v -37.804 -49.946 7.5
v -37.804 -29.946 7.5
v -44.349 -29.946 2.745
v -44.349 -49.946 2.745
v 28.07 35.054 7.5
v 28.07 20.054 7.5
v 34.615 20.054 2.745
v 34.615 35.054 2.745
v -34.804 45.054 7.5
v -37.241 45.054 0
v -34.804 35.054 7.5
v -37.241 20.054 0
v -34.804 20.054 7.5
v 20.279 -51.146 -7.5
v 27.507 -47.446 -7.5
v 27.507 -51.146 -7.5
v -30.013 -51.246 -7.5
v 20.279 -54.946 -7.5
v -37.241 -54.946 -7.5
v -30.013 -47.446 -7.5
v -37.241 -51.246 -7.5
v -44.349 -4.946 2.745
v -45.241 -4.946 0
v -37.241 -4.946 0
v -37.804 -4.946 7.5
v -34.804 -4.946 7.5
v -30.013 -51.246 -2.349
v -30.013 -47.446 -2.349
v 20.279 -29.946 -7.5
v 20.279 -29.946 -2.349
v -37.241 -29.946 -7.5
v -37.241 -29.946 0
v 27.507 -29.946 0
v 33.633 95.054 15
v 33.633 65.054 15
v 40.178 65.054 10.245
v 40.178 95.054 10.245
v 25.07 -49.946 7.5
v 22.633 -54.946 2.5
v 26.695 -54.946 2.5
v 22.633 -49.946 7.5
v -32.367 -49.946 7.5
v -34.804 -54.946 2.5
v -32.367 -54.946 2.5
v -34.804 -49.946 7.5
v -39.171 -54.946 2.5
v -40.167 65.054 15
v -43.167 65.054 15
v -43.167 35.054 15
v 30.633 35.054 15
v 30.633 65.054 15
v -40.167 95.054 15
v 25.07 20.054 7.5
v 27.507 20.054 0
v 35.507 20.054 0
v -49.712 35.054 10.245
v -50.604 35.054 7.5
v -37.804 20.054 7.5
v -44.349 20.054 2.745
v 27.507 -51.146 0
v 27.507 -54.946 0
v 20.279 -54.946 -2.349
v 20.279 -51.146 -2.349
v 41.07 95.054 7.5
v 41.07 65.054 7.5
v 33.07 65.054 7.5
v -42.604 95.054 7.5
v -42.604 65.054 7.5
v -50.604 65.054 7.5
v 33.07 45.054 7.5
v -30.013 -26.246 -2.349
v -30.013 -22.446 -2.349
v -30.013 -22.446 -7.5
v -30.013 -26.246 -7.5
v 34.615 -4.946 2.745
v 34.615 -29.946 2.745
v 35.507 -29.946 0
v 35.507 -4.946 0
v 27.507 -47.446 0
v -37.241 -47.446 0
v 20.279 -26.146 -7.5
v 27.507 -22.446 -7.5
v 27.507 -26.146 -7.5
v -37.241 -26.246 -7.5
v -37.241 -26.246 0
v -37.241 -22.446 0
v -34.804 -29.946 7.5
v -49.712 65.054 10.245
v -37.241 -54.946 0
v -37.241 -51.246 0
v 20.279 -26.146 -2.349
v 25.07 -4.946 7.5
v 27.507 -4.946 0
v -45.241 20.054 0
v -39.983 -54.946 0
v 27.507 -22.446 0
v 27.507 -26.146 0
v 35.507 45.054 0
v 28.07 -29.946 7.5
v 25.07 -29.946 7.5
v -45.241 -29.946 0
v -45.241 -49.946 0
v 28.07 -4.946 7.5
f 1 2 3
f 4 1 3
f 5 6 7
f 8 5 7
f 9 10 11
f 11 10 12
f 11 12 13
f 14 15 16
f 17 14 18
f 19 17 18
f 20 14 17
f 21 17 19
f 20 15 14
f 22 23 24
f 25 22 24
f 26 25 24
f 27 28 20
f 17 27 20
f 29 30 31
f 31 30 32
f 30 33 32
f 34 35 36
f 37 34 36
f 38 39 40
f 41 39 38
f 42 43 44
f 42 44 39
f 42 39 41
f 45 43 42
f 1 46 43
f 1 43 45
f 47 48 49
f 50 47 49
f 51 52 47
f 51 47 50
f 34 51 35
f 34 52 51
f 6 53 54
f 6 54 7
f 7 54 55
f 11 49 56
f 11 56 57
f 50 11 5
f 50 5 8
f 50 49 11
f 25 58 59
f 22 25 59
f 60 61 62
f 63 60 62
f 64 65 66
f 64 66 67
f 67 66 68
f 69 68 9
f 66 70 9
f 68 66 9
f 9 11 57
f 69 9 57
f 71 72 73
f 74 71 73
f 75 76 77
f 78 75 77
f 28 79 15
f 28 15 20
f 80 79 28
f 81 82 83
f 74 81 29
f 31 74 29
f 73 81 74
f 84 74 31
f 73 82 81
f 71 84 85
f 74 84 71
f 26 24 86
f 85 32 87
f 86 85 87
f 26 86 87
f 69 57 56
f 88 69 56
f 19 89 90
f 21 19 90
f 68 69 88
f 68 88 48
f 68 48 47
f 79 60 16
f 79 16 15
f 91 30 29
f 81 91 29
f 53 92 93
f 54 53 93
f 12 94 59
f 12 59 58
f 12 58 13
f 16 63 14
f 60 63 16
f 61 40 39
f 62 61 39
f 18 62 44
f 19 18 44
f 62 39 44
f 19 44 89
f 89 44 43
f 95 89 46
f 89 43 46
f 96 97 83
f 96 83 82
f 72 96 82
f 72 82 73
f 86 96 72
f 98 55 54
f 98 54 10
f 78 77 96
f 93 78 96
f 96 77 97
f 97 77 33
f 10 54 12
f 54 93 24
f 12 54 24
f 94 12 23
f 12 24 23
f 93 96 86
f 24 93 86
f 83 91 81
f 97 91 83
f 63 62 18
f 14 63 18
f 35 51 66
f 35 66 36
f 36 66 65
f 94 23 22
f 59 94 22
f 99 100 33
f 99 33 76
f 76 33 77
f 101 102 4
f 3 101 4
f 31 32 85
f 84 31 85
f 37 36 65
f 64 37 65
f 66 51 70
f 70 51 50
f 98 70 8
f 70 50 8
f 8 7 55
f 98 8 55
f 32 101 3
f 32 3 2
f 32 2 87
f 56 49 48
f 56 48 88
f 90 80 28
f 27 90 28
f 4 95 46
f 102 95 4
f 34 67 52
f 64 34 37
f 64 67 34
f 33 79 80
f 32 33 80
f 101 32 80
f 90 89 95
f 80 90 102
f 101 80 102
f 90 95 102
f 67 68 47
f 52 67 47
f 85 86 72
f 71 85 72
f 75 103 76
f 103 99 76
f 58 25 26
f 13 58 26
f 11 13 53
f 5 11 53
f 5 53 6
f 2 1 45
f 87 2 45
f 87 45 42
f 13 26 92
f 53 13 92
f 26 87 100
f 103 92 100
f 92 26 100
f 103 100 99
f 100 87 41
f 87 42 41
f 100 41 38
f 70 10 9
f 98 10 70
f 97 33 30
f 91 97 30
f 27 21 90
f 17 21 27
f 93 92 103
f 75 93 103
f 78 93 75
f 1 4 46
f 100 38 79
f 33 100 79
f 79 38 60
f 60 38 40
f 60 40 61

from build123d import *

# Parameters (mm, degrees)
BOSS_EXTRUDE1_DEPTH = 7.5
BOSS_EXTRUDE2_DEPTH = 7.5
DRAFT2_START        = -54.946043165
DRAFT2_DEPTH        = 100
DRAFT2_2_DEPTH      = 25
DRAFT2_START_2      = -29.946043165
DRAFT2_3_DEPTH      = 25
DRAFT2_START_3      = -4.946043165
DRAFT2_4_DEPTH      = 25
DRAFT2_START_4      = 20.053956835
DRAFT2_5_DEPTH      = 25
DRAFT2_START_5      = 35.053956835
DRAFT2_6_DEPTH      = 30
DRAFT2_START_6      = 65.053956835
DRAFT2_7_DEPTH      = 30
SKETCH3_W           = 64.747590887
SKETCH3_H           = 7.5
BOSS_EXTRUDE3_DEPTH = 7.5
CUT_EXTRUDE1_DEPTH  = 3.8
CUT_EXTRUDE2_DEPTH  = 3.8
LPATTERN1_COUNT     = 2
LPATTERN1_PITCH     = 25


# Read off the part's stored shape, not the designer's step: Draft2
with BuildPart() as part:
    # Sketch1 → Boss-Extrude1 (new body)
    with BuildSketch(Plane.XY):
        Polygon((-40.366906475, -54.946043165), (22.633093525, -54.946043165), (22.633093525, -29.946043165), (30.633093525, -29.946043165), (30.633093525, -4.946043165), (22.633093525, -4.946043165), (22.633093525, 20.053956835), (30.633093525, 20.053956835), (30.633093525, 45.053956835), (-32.366906475, 45.053956835), (-32.366906475, 20.053956835), (-40.366906475, 20.053956835), (-40.366906475, -4.946043165), (-32.366906475, -4.946043165), (-32.366906475, -29.946043165), (-40.366906475, -29.946043165), align=None)
    extrude(amount=BOSS_EXTRUDE1_DEPTH)

    # Sketch2 → Boss-Extrude2 (add)
    with BuildSketch(Plane.XY.offset(7.5)):
        Polygon((-48.166906475, 35.053956835), (30.633093525, 35.053956835), (30.633093525, 65.053956835), (38.633093525, 65.053956835), (38.633093525, 95.053956835), (-40.166906475, 95.053956835), (-40.166906475, 65.053956835), (-48.166906475, 65.053956835), align=None)
    extrude(amount=BOSS_EXTRUDE2_DEPTH)

    # Draft2 outline → Draft2 (add)
    with BuildSketch(Plane(origin=(0, 0, 0), x_dir=(1, 0, 0), z_dir=(0, 1, 0)).offset(DRAFT2_START)):
        Polygon((-32.366906475, 0), (-37.240701918, 0), (-34.803804197, -7.5), (-32.366906475, -7.5), align=None)
        Polygon((27.506888969, 0), (22.633093525, 0), (22.633093525, -7.5), (25.069991247, -7.5), align=None)
    extrude(amount=DRAFT2_DEPTH)

    # Draft2 2 outline → Draft2 2 (add)
    with BuildSketch(Plane(origin=(0, 0, 0), x_dir=(1, 0, 0), z_dir=(0, 1, 0)).offset(DRAFT2_START)):
        Polygon((-40.366906475, 0), (-45.240701918, 0), (-42.803804197, -7.5), (-40.366906475, -7.5), align=None)
    extrude(amount=DRAFT2_2_DEPTH)

    # Draft2 3 outline → Draft2 3 (add)
    with BuildSketch(Plane(origin=(0, 0, 0), x_dir=(1, 0, 0), z_dir=(0, 1, 0)).offset(DRAFT2_START_2)):
        Polygon((35.506888969, 0), (30.633093525, 0), (30.633093525, -7.5), (33.069991247, -7.5), align=None)
    extrude(amount=DRAFT2_3_DEPTH)

    # Draft2 4 outline → Draft2 4 (add)
    with BuildSketch(Plane(origin=(0, 0, 0), x_dir=(1, 0, 0), z_dir=(0, 1, 0)).offset(DRAFT2_START_3)):
        Polygon((-40.366906475, 0), (-45.240701918, 0), (-42.803804197, -7.5), (-40.366906475, -7.5), align=None)
    extrude(amount=DRAFT2_4_DEPTH)

    # Draft2 5 outline → Draft2 5 (add)
    with BuildSketch(Plane(origin=(0, 0, 0), x_dir=(1, 0, 0), z_dir=(0, 1, 0)).offset(DRAFT2_START_4)):
        Polygon((35.506888969, 0), (30.633093525, 0), (30.633093525, -7.5), (33.069991247, -7.5), align=None)
    extrude(amount=DRAFT2_5_DEPTH)

    # Draft2 6 outline → Draft2 6 (add)
    with BuildSketch(Plane(origin=(0, 0, 0), x_dir=(1, 0, 0), z_dir=(0, 1, 0)).offset(DRAFT2_START_5)):
        Polygon((-48.166906475, -15), (-48.166906475, -7.5), (-50.603804197, -7.5), align=None)
        Polygon((33.069991247, -7.5), (30.633093525, -7.5), (30.633093525, -15), align=None)
    extrude(amount=DRAFT2_6_DEPTH)

    # Draft2 7 outline → Draft2 7 (add)
    with BuildSketch(Plane(origin=(0, 0, 0), x_dir=(1, 0, 0), z_dir=(0, 1, 0)).offset(DRAFT2_START_6)):
        Polygon((41.069991247, -7.5), (38.633093525, -7.5), (38.633093525, -15), align=None)
        Polygon((-40.166906475, -7.5), (-42.603804197, -7.5), (-40.166906475, -15), align=None)
    extrude(amount=DRAFT2_7_DEPTH)

    # Sketch3 → Boss-Extrude3 (add)
    with BuildSketch(Plane(origin=(0, 0, 0), x_dir=(-1, 0, 0), z_dir=(0, 0, -1))):
        with Locations((4.866906474, -51.196043165)):
            Rectangle(SKETCH3_W, SKETCH3_H)
    boss_extrude3 = extrude(amount=BOSS_EXTRUDE3_DEPTH)

    # Sketch4 → Cut-Extrude1 (cut)
    with BuildSketch(Plane.XZ.offset(54.946043165)):
        Polygon((27.506888969, -7.5), (27.506888969, 0), (20.278859445, -2.348529157), (20.278859445, -7.5), align=None)
    cut_extrude1 = extrude(amount=-CUT_EXTRUDE1_DEPTH, mode=Mode.SUBTRACT)

    # Sketch5 → Cut-Extrude2 (cut)
    with BuildSketch(Plane(origin=(0, -47.446043165, 0), x_dir=(1, 0, 0), z_dir=(0, 1, 0))):
        Polygon((-37.240701918, 7.5), (-37.240701918, 0), (-30.012672394, 2.348529157), (-30.012672394, 7.5), align=None)
    cut_extrude2 = extrude(amount=-CUT_EXTRUDE2_DEPTH, mode=Mode.SUBTRACT)

    # LPattern1: Boss-Extrude3, Cut-Extrude1, Cut-Extrude2 ×2
    with Locations(*[(0, i * LPATTERN1_PITCH, 0) for i in range(1, LPATTERN1_COUNT)]):
        add(boss_extrude3)
        add(cut_extrude1, mode=Mode.SUBTRACT)
        add(cut_extrude2, mode=Mode.SUBTRACT)

    # Chamfer2
    # the kernel refuses this chamfer: 5 mm, written as the material it takes off along each edge
    with BuildSketch(Plane(origin=(-40.441261641, -51.612709832, 4.248239139), x_dir=(-0.7189342036162105, 0.6942471081166146, 0.033978872000742164), z_dir=(-0.4932114534551065, -0.5439749702030539, 0.6788473274406317))) as chamfer2_piece_1:
        Polygon((-3.286728939, 2.231187156), (3.915317626, 2.231187156), (-0.628588687, -4.462374312), align=None)
    extrude(amount=5.70452533, mode=Mode.SUBTRACT)
    with BuildSketch(Plane(origin=(33.069991247, -42.853897845, 7.5), x_dir=(-0.9997407638607628, 0, 0.022768510603425433), z_dir=(0, 1, 0))) as chamfer2_piece_2:
        with BuildLine():
            Line((5.163141872, 0), (-1.817393185, -4.83271311))
            Line((-1.817393185, -4.83271311), (-1.911770596, -4.799654007))
            ThreePointArc((-1.911770596, -4.799654007), (-0.947600353, -2.402729105), (-0.094377411, 0.033059103))
            Line((-0.094377411, 0.033059103), (0.002276851, 0.099974076))
            ThreePointArc((0.002276851, 0.099974076), (2.582509488, 0.041210789), (5.165418723, 0.099974076))
            Line((5.165418723, 0.099974076), (5.163141872, 0))
        make_face()
    extrude(amount=50.815709359, mode=Mode.SUBTRACT)
    with BuildSketch(Plane(origin=(-49.214170654, -54.946043165, -12.229079318), x_dir=(0.9506969379377622, -0.027495876610586285, -0.30890016018962835), z_dir=(0.309016994289291, 0, 0.951056516322985))) as chamfer2_piece_3:
        with BuildLine():
            Line((5.143365976, 0), (-0.282735774, 5.135588968))
            Line((-0.282735774, 5.135588968), (-0.382697966, 5.13283938))
            ThreePointArc((-0.382697966, 5.13283938), (-0.170646135, 2.566989148), (-0.099962192, -0.002749588))
            Line((-0.099962192, -0.002749588), (0.002749588, -0.099962192))
            ThreePointArc((0.002749588, -0.099962192), (2.572488324, -0.029278248), (5.146115564, -0.099962192))
            Line((5.146115564, -0.099962192), (5.143365976, 0))
        make_face()
    extrude(amount=33.602796561, mode=Mode.SUBTRACT)
    with BuildSketch(Plane(origin=(33.069991247, 7.146102155, 7.5), x_dir=(-0.9997407638607628, 0, 0.022768510603425433), z_dir=(0, 1, 0))) as chamfer2_piece_4:
        with BuildLine():
            Line((5.163141872, 0), (-1.817393185, -4.83271311))
            Line((-1.817393185, -4.83271311), (-1.911770596, -4.799654007))
            ThreePointArc((-1.911770596, -4.799654007), (-0.947600353, -2.402729105), (-0.094377411, 0.033059103))
            Line((-0.094377411, 0.033059103), (0.002276851, 0.099974076))
            ThreePointArc((0.002276851, 0.099974076), (2.582509488, 0.041210789), (5.165418723, 0.099974076))
            Line((5.165418723, 0.099974076), (5.163141872, 0))
        make_face()
    extrude(amount=27.90785468, mode=Mode.SUBTRACT)
    with BuildSketch(Plane(origin=(-42.803804197, -67.853897845, 7.5), x_dir=(0.9997407638607191, 0, 0.022768510605345404), z_dir=(0, 1, 0)), Plane(origin=(-42.803804197, -17.853897845, 7.5), x_dir=(0.9997407638607191, 0, 0.022768510605345404), z_dir=(0, 1, 0))) as chamfer2_piece_5:
        with BuildLine():
            Line((5.163141872, 0), (-1.817393184, 4.83271311))
            Line((-1.817393184, 4.83271311), (-1.911770595, 4.799654007))
            ThreePointArc((-1.911770595, 4.799654007), (-0.947600353, 2.402729105), (-0.094377411, -0.033059103))
            Line((-0.094377411, -0.033059103), (0.002276851, -0.099974076))
            ThreePointArc((0.002276851, -0.099974076), (2.582509488, -0.041210789), (5.165418723, -0.099974076))
            Line((5.165418723, -0.099974076), (5.163141872, 0))
        make_face()
    extrude(amount=50.815709359, mode=Mode.SUBTRACT)
    with BuildSketch(Plane(origin=(-48.166906475, 77.961811514, 15), x_dir=(0.9997407638607629, 0, 0.022768510603425628), z_dir=(0, -1, 0)), Plane(origin=(38.633093525, 52.146102155, 15), x_dir=(-0.9997407638607629, 0, 0.022768510603425628), z_dir=(0, 1, 0))) as chamfer2_piece_6:
        with BuildLine():
            Line((5.163141872, 0), (-1.817393185, -4.83271311))
            Line((-1.817393185, -4.83271311), (-1.911770596, -4.799654007))
            ThreePointArc((-1.911770596, -4.799654007), (-0.947600353, -2.402729105), (-0.094377411, 0.033059103))
            Line((-0.094377411, 0.033059103), (0.002276851, 0.099974076))
            ThreePointArc((0.002276851, 0.099974076), (2.582509488, 0.041210789), (5.165418723, 0.099974076))
            Line((5.165418723, 0.099974076), (5.163141872, 0))
        make_face()
    extrude(amount=55.815709359, mode=Mode.SUBTRACT)
    with BuildSketch(Plane(origin=(-32.366906475, -54.946043165, 7.5), x_dir=(0, -0.027495876610586317, -0.9996219169112968), z_dir=(1, 0, 0))) as chamfer2_piece_7:
        with BuildLine():
            Line((5.143365976, 0), (-0.282735774, 5.135588968))
            Line((-0.282735774, 5.135588968), (-0.382697966, 5.13283938))
            ThreePointArc((-0.382697966, 5.13283938), (-0.170646135, 2.566989148), (-0.099962192, -0.002749588))
            Line((-0.099962192, -0.002749588), (0.002749588, -0.099962192))
            ThreePointArc((0.002749588, -0.099962192), (2.572488324, -0.029278248), (5.146115564, -0.099962192))
            Line((5.146115564, -0.099962192), (5.143365976, 0))
        make_face()
    extrude(amount=55, mode=Mode.SUBTRACT)
    with BuildSketch(Plane(origin=(-34.803804197, -54.946043165, 7.5), x_dir=(0, -0.02749587670275982, -0.9996219169087613), z_dir=(1, 0, 0))) as chamfer2_piece_8:
        with BuildLine():
            Line((5.143365976, 0), (-0.282735775, 5.135588968))
            Line((-0.282735775, 5.135588968), (-0.382697967, 5.13283938))
            ThreePointArc((-0.382697967, 5.13283938), (-0.170646136, 2.566989148), (-0.099962192, -0.002749588))
            Line((-0.099962192, -0.002749588), (0.002749588, -0.099962192))
            ThreePointArc((0.002749588, -0.099962192), (2.572488324, -0.029278248), (5.146115564, -0.099962192))
            Line((5.146115564, -0.099962192), (5.143365976, 0))
        make_face()
    extrude(amount=2.436897722, mode=Mode.SUBTRACT)
    with BuildSketch(Plane(origin=(22.633093525, -54.946043165, 7.5), x_dir=(0, -0.02749587670275982, -0.9996219169087613), z_dir=(1, 0, 0))) as chamfer2_piece_9:
        with BuildLine():
            Line((5.143365976, 0), (-0.282735775, 5.135588968))
            Line((-0.282735775, 5.135588968), (-0.382697967, 5.13283938))
            ThreePointArc((-0.382697967, 5.13283938), (-0.170646136, 2.566989148), (-0.099962192, -0.002749588))
            Line((-0.099962192, -0.002749588), (0.002749588, -0.099962192))
            ThreePointArc((0.002749588, -0.099962192), (2.572488324, -0.029278248), (5.146115564, -0.099962192))
            Line((5.146115564, -0.099962192), (5.143365976, 0))
        make_face()
    extrude(amount=15.295312662, mode=Mode.SUBTRACT)
    with BuildSketch(Plane(origin=(-40.366906475, -54.946043165, 7.5), x_dir=(0, -0.027495876610586317, -0.9996219169112968), z_dir=(1, 0, 0))) as chamfer2_piece_10:
        with BuildLine():
            Line((5.143365976, 0), (-0.282735774, 5.135588968))
            Line((-0.282735774, 5.135588968), (-0.382697966, 5.13283938))
            ThreePointArc((-0.382697966, 5.13283938), (-0.170646135, 2.566989148), (-0.099962192, -0.002749588))
            Line((-0.099962192, -0.002749588), (0.002749588, -0.099962192))
            ThreePointArc((0.002749588, -0.099962192), (2.572488324, -0.029278248), (5.146115564, -0.099962192))
            Line((5.146115564, -0.099962192), (5.143365976, 0))
        make_face()
    extrude(amount=5.563102278, mode=Mode.SUBTRACT)
    with BuildSketch(Plane(origin=(-55.662219137, -54.946043165, 7.5), x_dir=(0, -0.027495876610586317, -0.9996219169112968), z_dir=(1, 0, 0))) as chamfer2_piece_11:
        with BuildLine():
            Line((5.143365976, 0), (-0.282735774, 5.135588968))
            Line((-0.282735774, 5.135588968), (-0.382697966, 5.13283938))
            ThreePointArc((-0.382697966, 5.13283938), (-0.170646135, 2.566989148), (-0.099962192, -0.002749588))
            Line((-0.099962192, -0.002749588), (0.002749588, -0.099962192))
            ThreePointArc((0.002749588, -0.099962192), (2.572488324, -0.029278248), (5.146115564, -0.099962192))
            Line((5.146115564, -0.099962192), (5.143365976, 0))
        make_face()
    extrude(amount=15.295312662, mode=Mode.SUBTRACT)


solid = part.part
